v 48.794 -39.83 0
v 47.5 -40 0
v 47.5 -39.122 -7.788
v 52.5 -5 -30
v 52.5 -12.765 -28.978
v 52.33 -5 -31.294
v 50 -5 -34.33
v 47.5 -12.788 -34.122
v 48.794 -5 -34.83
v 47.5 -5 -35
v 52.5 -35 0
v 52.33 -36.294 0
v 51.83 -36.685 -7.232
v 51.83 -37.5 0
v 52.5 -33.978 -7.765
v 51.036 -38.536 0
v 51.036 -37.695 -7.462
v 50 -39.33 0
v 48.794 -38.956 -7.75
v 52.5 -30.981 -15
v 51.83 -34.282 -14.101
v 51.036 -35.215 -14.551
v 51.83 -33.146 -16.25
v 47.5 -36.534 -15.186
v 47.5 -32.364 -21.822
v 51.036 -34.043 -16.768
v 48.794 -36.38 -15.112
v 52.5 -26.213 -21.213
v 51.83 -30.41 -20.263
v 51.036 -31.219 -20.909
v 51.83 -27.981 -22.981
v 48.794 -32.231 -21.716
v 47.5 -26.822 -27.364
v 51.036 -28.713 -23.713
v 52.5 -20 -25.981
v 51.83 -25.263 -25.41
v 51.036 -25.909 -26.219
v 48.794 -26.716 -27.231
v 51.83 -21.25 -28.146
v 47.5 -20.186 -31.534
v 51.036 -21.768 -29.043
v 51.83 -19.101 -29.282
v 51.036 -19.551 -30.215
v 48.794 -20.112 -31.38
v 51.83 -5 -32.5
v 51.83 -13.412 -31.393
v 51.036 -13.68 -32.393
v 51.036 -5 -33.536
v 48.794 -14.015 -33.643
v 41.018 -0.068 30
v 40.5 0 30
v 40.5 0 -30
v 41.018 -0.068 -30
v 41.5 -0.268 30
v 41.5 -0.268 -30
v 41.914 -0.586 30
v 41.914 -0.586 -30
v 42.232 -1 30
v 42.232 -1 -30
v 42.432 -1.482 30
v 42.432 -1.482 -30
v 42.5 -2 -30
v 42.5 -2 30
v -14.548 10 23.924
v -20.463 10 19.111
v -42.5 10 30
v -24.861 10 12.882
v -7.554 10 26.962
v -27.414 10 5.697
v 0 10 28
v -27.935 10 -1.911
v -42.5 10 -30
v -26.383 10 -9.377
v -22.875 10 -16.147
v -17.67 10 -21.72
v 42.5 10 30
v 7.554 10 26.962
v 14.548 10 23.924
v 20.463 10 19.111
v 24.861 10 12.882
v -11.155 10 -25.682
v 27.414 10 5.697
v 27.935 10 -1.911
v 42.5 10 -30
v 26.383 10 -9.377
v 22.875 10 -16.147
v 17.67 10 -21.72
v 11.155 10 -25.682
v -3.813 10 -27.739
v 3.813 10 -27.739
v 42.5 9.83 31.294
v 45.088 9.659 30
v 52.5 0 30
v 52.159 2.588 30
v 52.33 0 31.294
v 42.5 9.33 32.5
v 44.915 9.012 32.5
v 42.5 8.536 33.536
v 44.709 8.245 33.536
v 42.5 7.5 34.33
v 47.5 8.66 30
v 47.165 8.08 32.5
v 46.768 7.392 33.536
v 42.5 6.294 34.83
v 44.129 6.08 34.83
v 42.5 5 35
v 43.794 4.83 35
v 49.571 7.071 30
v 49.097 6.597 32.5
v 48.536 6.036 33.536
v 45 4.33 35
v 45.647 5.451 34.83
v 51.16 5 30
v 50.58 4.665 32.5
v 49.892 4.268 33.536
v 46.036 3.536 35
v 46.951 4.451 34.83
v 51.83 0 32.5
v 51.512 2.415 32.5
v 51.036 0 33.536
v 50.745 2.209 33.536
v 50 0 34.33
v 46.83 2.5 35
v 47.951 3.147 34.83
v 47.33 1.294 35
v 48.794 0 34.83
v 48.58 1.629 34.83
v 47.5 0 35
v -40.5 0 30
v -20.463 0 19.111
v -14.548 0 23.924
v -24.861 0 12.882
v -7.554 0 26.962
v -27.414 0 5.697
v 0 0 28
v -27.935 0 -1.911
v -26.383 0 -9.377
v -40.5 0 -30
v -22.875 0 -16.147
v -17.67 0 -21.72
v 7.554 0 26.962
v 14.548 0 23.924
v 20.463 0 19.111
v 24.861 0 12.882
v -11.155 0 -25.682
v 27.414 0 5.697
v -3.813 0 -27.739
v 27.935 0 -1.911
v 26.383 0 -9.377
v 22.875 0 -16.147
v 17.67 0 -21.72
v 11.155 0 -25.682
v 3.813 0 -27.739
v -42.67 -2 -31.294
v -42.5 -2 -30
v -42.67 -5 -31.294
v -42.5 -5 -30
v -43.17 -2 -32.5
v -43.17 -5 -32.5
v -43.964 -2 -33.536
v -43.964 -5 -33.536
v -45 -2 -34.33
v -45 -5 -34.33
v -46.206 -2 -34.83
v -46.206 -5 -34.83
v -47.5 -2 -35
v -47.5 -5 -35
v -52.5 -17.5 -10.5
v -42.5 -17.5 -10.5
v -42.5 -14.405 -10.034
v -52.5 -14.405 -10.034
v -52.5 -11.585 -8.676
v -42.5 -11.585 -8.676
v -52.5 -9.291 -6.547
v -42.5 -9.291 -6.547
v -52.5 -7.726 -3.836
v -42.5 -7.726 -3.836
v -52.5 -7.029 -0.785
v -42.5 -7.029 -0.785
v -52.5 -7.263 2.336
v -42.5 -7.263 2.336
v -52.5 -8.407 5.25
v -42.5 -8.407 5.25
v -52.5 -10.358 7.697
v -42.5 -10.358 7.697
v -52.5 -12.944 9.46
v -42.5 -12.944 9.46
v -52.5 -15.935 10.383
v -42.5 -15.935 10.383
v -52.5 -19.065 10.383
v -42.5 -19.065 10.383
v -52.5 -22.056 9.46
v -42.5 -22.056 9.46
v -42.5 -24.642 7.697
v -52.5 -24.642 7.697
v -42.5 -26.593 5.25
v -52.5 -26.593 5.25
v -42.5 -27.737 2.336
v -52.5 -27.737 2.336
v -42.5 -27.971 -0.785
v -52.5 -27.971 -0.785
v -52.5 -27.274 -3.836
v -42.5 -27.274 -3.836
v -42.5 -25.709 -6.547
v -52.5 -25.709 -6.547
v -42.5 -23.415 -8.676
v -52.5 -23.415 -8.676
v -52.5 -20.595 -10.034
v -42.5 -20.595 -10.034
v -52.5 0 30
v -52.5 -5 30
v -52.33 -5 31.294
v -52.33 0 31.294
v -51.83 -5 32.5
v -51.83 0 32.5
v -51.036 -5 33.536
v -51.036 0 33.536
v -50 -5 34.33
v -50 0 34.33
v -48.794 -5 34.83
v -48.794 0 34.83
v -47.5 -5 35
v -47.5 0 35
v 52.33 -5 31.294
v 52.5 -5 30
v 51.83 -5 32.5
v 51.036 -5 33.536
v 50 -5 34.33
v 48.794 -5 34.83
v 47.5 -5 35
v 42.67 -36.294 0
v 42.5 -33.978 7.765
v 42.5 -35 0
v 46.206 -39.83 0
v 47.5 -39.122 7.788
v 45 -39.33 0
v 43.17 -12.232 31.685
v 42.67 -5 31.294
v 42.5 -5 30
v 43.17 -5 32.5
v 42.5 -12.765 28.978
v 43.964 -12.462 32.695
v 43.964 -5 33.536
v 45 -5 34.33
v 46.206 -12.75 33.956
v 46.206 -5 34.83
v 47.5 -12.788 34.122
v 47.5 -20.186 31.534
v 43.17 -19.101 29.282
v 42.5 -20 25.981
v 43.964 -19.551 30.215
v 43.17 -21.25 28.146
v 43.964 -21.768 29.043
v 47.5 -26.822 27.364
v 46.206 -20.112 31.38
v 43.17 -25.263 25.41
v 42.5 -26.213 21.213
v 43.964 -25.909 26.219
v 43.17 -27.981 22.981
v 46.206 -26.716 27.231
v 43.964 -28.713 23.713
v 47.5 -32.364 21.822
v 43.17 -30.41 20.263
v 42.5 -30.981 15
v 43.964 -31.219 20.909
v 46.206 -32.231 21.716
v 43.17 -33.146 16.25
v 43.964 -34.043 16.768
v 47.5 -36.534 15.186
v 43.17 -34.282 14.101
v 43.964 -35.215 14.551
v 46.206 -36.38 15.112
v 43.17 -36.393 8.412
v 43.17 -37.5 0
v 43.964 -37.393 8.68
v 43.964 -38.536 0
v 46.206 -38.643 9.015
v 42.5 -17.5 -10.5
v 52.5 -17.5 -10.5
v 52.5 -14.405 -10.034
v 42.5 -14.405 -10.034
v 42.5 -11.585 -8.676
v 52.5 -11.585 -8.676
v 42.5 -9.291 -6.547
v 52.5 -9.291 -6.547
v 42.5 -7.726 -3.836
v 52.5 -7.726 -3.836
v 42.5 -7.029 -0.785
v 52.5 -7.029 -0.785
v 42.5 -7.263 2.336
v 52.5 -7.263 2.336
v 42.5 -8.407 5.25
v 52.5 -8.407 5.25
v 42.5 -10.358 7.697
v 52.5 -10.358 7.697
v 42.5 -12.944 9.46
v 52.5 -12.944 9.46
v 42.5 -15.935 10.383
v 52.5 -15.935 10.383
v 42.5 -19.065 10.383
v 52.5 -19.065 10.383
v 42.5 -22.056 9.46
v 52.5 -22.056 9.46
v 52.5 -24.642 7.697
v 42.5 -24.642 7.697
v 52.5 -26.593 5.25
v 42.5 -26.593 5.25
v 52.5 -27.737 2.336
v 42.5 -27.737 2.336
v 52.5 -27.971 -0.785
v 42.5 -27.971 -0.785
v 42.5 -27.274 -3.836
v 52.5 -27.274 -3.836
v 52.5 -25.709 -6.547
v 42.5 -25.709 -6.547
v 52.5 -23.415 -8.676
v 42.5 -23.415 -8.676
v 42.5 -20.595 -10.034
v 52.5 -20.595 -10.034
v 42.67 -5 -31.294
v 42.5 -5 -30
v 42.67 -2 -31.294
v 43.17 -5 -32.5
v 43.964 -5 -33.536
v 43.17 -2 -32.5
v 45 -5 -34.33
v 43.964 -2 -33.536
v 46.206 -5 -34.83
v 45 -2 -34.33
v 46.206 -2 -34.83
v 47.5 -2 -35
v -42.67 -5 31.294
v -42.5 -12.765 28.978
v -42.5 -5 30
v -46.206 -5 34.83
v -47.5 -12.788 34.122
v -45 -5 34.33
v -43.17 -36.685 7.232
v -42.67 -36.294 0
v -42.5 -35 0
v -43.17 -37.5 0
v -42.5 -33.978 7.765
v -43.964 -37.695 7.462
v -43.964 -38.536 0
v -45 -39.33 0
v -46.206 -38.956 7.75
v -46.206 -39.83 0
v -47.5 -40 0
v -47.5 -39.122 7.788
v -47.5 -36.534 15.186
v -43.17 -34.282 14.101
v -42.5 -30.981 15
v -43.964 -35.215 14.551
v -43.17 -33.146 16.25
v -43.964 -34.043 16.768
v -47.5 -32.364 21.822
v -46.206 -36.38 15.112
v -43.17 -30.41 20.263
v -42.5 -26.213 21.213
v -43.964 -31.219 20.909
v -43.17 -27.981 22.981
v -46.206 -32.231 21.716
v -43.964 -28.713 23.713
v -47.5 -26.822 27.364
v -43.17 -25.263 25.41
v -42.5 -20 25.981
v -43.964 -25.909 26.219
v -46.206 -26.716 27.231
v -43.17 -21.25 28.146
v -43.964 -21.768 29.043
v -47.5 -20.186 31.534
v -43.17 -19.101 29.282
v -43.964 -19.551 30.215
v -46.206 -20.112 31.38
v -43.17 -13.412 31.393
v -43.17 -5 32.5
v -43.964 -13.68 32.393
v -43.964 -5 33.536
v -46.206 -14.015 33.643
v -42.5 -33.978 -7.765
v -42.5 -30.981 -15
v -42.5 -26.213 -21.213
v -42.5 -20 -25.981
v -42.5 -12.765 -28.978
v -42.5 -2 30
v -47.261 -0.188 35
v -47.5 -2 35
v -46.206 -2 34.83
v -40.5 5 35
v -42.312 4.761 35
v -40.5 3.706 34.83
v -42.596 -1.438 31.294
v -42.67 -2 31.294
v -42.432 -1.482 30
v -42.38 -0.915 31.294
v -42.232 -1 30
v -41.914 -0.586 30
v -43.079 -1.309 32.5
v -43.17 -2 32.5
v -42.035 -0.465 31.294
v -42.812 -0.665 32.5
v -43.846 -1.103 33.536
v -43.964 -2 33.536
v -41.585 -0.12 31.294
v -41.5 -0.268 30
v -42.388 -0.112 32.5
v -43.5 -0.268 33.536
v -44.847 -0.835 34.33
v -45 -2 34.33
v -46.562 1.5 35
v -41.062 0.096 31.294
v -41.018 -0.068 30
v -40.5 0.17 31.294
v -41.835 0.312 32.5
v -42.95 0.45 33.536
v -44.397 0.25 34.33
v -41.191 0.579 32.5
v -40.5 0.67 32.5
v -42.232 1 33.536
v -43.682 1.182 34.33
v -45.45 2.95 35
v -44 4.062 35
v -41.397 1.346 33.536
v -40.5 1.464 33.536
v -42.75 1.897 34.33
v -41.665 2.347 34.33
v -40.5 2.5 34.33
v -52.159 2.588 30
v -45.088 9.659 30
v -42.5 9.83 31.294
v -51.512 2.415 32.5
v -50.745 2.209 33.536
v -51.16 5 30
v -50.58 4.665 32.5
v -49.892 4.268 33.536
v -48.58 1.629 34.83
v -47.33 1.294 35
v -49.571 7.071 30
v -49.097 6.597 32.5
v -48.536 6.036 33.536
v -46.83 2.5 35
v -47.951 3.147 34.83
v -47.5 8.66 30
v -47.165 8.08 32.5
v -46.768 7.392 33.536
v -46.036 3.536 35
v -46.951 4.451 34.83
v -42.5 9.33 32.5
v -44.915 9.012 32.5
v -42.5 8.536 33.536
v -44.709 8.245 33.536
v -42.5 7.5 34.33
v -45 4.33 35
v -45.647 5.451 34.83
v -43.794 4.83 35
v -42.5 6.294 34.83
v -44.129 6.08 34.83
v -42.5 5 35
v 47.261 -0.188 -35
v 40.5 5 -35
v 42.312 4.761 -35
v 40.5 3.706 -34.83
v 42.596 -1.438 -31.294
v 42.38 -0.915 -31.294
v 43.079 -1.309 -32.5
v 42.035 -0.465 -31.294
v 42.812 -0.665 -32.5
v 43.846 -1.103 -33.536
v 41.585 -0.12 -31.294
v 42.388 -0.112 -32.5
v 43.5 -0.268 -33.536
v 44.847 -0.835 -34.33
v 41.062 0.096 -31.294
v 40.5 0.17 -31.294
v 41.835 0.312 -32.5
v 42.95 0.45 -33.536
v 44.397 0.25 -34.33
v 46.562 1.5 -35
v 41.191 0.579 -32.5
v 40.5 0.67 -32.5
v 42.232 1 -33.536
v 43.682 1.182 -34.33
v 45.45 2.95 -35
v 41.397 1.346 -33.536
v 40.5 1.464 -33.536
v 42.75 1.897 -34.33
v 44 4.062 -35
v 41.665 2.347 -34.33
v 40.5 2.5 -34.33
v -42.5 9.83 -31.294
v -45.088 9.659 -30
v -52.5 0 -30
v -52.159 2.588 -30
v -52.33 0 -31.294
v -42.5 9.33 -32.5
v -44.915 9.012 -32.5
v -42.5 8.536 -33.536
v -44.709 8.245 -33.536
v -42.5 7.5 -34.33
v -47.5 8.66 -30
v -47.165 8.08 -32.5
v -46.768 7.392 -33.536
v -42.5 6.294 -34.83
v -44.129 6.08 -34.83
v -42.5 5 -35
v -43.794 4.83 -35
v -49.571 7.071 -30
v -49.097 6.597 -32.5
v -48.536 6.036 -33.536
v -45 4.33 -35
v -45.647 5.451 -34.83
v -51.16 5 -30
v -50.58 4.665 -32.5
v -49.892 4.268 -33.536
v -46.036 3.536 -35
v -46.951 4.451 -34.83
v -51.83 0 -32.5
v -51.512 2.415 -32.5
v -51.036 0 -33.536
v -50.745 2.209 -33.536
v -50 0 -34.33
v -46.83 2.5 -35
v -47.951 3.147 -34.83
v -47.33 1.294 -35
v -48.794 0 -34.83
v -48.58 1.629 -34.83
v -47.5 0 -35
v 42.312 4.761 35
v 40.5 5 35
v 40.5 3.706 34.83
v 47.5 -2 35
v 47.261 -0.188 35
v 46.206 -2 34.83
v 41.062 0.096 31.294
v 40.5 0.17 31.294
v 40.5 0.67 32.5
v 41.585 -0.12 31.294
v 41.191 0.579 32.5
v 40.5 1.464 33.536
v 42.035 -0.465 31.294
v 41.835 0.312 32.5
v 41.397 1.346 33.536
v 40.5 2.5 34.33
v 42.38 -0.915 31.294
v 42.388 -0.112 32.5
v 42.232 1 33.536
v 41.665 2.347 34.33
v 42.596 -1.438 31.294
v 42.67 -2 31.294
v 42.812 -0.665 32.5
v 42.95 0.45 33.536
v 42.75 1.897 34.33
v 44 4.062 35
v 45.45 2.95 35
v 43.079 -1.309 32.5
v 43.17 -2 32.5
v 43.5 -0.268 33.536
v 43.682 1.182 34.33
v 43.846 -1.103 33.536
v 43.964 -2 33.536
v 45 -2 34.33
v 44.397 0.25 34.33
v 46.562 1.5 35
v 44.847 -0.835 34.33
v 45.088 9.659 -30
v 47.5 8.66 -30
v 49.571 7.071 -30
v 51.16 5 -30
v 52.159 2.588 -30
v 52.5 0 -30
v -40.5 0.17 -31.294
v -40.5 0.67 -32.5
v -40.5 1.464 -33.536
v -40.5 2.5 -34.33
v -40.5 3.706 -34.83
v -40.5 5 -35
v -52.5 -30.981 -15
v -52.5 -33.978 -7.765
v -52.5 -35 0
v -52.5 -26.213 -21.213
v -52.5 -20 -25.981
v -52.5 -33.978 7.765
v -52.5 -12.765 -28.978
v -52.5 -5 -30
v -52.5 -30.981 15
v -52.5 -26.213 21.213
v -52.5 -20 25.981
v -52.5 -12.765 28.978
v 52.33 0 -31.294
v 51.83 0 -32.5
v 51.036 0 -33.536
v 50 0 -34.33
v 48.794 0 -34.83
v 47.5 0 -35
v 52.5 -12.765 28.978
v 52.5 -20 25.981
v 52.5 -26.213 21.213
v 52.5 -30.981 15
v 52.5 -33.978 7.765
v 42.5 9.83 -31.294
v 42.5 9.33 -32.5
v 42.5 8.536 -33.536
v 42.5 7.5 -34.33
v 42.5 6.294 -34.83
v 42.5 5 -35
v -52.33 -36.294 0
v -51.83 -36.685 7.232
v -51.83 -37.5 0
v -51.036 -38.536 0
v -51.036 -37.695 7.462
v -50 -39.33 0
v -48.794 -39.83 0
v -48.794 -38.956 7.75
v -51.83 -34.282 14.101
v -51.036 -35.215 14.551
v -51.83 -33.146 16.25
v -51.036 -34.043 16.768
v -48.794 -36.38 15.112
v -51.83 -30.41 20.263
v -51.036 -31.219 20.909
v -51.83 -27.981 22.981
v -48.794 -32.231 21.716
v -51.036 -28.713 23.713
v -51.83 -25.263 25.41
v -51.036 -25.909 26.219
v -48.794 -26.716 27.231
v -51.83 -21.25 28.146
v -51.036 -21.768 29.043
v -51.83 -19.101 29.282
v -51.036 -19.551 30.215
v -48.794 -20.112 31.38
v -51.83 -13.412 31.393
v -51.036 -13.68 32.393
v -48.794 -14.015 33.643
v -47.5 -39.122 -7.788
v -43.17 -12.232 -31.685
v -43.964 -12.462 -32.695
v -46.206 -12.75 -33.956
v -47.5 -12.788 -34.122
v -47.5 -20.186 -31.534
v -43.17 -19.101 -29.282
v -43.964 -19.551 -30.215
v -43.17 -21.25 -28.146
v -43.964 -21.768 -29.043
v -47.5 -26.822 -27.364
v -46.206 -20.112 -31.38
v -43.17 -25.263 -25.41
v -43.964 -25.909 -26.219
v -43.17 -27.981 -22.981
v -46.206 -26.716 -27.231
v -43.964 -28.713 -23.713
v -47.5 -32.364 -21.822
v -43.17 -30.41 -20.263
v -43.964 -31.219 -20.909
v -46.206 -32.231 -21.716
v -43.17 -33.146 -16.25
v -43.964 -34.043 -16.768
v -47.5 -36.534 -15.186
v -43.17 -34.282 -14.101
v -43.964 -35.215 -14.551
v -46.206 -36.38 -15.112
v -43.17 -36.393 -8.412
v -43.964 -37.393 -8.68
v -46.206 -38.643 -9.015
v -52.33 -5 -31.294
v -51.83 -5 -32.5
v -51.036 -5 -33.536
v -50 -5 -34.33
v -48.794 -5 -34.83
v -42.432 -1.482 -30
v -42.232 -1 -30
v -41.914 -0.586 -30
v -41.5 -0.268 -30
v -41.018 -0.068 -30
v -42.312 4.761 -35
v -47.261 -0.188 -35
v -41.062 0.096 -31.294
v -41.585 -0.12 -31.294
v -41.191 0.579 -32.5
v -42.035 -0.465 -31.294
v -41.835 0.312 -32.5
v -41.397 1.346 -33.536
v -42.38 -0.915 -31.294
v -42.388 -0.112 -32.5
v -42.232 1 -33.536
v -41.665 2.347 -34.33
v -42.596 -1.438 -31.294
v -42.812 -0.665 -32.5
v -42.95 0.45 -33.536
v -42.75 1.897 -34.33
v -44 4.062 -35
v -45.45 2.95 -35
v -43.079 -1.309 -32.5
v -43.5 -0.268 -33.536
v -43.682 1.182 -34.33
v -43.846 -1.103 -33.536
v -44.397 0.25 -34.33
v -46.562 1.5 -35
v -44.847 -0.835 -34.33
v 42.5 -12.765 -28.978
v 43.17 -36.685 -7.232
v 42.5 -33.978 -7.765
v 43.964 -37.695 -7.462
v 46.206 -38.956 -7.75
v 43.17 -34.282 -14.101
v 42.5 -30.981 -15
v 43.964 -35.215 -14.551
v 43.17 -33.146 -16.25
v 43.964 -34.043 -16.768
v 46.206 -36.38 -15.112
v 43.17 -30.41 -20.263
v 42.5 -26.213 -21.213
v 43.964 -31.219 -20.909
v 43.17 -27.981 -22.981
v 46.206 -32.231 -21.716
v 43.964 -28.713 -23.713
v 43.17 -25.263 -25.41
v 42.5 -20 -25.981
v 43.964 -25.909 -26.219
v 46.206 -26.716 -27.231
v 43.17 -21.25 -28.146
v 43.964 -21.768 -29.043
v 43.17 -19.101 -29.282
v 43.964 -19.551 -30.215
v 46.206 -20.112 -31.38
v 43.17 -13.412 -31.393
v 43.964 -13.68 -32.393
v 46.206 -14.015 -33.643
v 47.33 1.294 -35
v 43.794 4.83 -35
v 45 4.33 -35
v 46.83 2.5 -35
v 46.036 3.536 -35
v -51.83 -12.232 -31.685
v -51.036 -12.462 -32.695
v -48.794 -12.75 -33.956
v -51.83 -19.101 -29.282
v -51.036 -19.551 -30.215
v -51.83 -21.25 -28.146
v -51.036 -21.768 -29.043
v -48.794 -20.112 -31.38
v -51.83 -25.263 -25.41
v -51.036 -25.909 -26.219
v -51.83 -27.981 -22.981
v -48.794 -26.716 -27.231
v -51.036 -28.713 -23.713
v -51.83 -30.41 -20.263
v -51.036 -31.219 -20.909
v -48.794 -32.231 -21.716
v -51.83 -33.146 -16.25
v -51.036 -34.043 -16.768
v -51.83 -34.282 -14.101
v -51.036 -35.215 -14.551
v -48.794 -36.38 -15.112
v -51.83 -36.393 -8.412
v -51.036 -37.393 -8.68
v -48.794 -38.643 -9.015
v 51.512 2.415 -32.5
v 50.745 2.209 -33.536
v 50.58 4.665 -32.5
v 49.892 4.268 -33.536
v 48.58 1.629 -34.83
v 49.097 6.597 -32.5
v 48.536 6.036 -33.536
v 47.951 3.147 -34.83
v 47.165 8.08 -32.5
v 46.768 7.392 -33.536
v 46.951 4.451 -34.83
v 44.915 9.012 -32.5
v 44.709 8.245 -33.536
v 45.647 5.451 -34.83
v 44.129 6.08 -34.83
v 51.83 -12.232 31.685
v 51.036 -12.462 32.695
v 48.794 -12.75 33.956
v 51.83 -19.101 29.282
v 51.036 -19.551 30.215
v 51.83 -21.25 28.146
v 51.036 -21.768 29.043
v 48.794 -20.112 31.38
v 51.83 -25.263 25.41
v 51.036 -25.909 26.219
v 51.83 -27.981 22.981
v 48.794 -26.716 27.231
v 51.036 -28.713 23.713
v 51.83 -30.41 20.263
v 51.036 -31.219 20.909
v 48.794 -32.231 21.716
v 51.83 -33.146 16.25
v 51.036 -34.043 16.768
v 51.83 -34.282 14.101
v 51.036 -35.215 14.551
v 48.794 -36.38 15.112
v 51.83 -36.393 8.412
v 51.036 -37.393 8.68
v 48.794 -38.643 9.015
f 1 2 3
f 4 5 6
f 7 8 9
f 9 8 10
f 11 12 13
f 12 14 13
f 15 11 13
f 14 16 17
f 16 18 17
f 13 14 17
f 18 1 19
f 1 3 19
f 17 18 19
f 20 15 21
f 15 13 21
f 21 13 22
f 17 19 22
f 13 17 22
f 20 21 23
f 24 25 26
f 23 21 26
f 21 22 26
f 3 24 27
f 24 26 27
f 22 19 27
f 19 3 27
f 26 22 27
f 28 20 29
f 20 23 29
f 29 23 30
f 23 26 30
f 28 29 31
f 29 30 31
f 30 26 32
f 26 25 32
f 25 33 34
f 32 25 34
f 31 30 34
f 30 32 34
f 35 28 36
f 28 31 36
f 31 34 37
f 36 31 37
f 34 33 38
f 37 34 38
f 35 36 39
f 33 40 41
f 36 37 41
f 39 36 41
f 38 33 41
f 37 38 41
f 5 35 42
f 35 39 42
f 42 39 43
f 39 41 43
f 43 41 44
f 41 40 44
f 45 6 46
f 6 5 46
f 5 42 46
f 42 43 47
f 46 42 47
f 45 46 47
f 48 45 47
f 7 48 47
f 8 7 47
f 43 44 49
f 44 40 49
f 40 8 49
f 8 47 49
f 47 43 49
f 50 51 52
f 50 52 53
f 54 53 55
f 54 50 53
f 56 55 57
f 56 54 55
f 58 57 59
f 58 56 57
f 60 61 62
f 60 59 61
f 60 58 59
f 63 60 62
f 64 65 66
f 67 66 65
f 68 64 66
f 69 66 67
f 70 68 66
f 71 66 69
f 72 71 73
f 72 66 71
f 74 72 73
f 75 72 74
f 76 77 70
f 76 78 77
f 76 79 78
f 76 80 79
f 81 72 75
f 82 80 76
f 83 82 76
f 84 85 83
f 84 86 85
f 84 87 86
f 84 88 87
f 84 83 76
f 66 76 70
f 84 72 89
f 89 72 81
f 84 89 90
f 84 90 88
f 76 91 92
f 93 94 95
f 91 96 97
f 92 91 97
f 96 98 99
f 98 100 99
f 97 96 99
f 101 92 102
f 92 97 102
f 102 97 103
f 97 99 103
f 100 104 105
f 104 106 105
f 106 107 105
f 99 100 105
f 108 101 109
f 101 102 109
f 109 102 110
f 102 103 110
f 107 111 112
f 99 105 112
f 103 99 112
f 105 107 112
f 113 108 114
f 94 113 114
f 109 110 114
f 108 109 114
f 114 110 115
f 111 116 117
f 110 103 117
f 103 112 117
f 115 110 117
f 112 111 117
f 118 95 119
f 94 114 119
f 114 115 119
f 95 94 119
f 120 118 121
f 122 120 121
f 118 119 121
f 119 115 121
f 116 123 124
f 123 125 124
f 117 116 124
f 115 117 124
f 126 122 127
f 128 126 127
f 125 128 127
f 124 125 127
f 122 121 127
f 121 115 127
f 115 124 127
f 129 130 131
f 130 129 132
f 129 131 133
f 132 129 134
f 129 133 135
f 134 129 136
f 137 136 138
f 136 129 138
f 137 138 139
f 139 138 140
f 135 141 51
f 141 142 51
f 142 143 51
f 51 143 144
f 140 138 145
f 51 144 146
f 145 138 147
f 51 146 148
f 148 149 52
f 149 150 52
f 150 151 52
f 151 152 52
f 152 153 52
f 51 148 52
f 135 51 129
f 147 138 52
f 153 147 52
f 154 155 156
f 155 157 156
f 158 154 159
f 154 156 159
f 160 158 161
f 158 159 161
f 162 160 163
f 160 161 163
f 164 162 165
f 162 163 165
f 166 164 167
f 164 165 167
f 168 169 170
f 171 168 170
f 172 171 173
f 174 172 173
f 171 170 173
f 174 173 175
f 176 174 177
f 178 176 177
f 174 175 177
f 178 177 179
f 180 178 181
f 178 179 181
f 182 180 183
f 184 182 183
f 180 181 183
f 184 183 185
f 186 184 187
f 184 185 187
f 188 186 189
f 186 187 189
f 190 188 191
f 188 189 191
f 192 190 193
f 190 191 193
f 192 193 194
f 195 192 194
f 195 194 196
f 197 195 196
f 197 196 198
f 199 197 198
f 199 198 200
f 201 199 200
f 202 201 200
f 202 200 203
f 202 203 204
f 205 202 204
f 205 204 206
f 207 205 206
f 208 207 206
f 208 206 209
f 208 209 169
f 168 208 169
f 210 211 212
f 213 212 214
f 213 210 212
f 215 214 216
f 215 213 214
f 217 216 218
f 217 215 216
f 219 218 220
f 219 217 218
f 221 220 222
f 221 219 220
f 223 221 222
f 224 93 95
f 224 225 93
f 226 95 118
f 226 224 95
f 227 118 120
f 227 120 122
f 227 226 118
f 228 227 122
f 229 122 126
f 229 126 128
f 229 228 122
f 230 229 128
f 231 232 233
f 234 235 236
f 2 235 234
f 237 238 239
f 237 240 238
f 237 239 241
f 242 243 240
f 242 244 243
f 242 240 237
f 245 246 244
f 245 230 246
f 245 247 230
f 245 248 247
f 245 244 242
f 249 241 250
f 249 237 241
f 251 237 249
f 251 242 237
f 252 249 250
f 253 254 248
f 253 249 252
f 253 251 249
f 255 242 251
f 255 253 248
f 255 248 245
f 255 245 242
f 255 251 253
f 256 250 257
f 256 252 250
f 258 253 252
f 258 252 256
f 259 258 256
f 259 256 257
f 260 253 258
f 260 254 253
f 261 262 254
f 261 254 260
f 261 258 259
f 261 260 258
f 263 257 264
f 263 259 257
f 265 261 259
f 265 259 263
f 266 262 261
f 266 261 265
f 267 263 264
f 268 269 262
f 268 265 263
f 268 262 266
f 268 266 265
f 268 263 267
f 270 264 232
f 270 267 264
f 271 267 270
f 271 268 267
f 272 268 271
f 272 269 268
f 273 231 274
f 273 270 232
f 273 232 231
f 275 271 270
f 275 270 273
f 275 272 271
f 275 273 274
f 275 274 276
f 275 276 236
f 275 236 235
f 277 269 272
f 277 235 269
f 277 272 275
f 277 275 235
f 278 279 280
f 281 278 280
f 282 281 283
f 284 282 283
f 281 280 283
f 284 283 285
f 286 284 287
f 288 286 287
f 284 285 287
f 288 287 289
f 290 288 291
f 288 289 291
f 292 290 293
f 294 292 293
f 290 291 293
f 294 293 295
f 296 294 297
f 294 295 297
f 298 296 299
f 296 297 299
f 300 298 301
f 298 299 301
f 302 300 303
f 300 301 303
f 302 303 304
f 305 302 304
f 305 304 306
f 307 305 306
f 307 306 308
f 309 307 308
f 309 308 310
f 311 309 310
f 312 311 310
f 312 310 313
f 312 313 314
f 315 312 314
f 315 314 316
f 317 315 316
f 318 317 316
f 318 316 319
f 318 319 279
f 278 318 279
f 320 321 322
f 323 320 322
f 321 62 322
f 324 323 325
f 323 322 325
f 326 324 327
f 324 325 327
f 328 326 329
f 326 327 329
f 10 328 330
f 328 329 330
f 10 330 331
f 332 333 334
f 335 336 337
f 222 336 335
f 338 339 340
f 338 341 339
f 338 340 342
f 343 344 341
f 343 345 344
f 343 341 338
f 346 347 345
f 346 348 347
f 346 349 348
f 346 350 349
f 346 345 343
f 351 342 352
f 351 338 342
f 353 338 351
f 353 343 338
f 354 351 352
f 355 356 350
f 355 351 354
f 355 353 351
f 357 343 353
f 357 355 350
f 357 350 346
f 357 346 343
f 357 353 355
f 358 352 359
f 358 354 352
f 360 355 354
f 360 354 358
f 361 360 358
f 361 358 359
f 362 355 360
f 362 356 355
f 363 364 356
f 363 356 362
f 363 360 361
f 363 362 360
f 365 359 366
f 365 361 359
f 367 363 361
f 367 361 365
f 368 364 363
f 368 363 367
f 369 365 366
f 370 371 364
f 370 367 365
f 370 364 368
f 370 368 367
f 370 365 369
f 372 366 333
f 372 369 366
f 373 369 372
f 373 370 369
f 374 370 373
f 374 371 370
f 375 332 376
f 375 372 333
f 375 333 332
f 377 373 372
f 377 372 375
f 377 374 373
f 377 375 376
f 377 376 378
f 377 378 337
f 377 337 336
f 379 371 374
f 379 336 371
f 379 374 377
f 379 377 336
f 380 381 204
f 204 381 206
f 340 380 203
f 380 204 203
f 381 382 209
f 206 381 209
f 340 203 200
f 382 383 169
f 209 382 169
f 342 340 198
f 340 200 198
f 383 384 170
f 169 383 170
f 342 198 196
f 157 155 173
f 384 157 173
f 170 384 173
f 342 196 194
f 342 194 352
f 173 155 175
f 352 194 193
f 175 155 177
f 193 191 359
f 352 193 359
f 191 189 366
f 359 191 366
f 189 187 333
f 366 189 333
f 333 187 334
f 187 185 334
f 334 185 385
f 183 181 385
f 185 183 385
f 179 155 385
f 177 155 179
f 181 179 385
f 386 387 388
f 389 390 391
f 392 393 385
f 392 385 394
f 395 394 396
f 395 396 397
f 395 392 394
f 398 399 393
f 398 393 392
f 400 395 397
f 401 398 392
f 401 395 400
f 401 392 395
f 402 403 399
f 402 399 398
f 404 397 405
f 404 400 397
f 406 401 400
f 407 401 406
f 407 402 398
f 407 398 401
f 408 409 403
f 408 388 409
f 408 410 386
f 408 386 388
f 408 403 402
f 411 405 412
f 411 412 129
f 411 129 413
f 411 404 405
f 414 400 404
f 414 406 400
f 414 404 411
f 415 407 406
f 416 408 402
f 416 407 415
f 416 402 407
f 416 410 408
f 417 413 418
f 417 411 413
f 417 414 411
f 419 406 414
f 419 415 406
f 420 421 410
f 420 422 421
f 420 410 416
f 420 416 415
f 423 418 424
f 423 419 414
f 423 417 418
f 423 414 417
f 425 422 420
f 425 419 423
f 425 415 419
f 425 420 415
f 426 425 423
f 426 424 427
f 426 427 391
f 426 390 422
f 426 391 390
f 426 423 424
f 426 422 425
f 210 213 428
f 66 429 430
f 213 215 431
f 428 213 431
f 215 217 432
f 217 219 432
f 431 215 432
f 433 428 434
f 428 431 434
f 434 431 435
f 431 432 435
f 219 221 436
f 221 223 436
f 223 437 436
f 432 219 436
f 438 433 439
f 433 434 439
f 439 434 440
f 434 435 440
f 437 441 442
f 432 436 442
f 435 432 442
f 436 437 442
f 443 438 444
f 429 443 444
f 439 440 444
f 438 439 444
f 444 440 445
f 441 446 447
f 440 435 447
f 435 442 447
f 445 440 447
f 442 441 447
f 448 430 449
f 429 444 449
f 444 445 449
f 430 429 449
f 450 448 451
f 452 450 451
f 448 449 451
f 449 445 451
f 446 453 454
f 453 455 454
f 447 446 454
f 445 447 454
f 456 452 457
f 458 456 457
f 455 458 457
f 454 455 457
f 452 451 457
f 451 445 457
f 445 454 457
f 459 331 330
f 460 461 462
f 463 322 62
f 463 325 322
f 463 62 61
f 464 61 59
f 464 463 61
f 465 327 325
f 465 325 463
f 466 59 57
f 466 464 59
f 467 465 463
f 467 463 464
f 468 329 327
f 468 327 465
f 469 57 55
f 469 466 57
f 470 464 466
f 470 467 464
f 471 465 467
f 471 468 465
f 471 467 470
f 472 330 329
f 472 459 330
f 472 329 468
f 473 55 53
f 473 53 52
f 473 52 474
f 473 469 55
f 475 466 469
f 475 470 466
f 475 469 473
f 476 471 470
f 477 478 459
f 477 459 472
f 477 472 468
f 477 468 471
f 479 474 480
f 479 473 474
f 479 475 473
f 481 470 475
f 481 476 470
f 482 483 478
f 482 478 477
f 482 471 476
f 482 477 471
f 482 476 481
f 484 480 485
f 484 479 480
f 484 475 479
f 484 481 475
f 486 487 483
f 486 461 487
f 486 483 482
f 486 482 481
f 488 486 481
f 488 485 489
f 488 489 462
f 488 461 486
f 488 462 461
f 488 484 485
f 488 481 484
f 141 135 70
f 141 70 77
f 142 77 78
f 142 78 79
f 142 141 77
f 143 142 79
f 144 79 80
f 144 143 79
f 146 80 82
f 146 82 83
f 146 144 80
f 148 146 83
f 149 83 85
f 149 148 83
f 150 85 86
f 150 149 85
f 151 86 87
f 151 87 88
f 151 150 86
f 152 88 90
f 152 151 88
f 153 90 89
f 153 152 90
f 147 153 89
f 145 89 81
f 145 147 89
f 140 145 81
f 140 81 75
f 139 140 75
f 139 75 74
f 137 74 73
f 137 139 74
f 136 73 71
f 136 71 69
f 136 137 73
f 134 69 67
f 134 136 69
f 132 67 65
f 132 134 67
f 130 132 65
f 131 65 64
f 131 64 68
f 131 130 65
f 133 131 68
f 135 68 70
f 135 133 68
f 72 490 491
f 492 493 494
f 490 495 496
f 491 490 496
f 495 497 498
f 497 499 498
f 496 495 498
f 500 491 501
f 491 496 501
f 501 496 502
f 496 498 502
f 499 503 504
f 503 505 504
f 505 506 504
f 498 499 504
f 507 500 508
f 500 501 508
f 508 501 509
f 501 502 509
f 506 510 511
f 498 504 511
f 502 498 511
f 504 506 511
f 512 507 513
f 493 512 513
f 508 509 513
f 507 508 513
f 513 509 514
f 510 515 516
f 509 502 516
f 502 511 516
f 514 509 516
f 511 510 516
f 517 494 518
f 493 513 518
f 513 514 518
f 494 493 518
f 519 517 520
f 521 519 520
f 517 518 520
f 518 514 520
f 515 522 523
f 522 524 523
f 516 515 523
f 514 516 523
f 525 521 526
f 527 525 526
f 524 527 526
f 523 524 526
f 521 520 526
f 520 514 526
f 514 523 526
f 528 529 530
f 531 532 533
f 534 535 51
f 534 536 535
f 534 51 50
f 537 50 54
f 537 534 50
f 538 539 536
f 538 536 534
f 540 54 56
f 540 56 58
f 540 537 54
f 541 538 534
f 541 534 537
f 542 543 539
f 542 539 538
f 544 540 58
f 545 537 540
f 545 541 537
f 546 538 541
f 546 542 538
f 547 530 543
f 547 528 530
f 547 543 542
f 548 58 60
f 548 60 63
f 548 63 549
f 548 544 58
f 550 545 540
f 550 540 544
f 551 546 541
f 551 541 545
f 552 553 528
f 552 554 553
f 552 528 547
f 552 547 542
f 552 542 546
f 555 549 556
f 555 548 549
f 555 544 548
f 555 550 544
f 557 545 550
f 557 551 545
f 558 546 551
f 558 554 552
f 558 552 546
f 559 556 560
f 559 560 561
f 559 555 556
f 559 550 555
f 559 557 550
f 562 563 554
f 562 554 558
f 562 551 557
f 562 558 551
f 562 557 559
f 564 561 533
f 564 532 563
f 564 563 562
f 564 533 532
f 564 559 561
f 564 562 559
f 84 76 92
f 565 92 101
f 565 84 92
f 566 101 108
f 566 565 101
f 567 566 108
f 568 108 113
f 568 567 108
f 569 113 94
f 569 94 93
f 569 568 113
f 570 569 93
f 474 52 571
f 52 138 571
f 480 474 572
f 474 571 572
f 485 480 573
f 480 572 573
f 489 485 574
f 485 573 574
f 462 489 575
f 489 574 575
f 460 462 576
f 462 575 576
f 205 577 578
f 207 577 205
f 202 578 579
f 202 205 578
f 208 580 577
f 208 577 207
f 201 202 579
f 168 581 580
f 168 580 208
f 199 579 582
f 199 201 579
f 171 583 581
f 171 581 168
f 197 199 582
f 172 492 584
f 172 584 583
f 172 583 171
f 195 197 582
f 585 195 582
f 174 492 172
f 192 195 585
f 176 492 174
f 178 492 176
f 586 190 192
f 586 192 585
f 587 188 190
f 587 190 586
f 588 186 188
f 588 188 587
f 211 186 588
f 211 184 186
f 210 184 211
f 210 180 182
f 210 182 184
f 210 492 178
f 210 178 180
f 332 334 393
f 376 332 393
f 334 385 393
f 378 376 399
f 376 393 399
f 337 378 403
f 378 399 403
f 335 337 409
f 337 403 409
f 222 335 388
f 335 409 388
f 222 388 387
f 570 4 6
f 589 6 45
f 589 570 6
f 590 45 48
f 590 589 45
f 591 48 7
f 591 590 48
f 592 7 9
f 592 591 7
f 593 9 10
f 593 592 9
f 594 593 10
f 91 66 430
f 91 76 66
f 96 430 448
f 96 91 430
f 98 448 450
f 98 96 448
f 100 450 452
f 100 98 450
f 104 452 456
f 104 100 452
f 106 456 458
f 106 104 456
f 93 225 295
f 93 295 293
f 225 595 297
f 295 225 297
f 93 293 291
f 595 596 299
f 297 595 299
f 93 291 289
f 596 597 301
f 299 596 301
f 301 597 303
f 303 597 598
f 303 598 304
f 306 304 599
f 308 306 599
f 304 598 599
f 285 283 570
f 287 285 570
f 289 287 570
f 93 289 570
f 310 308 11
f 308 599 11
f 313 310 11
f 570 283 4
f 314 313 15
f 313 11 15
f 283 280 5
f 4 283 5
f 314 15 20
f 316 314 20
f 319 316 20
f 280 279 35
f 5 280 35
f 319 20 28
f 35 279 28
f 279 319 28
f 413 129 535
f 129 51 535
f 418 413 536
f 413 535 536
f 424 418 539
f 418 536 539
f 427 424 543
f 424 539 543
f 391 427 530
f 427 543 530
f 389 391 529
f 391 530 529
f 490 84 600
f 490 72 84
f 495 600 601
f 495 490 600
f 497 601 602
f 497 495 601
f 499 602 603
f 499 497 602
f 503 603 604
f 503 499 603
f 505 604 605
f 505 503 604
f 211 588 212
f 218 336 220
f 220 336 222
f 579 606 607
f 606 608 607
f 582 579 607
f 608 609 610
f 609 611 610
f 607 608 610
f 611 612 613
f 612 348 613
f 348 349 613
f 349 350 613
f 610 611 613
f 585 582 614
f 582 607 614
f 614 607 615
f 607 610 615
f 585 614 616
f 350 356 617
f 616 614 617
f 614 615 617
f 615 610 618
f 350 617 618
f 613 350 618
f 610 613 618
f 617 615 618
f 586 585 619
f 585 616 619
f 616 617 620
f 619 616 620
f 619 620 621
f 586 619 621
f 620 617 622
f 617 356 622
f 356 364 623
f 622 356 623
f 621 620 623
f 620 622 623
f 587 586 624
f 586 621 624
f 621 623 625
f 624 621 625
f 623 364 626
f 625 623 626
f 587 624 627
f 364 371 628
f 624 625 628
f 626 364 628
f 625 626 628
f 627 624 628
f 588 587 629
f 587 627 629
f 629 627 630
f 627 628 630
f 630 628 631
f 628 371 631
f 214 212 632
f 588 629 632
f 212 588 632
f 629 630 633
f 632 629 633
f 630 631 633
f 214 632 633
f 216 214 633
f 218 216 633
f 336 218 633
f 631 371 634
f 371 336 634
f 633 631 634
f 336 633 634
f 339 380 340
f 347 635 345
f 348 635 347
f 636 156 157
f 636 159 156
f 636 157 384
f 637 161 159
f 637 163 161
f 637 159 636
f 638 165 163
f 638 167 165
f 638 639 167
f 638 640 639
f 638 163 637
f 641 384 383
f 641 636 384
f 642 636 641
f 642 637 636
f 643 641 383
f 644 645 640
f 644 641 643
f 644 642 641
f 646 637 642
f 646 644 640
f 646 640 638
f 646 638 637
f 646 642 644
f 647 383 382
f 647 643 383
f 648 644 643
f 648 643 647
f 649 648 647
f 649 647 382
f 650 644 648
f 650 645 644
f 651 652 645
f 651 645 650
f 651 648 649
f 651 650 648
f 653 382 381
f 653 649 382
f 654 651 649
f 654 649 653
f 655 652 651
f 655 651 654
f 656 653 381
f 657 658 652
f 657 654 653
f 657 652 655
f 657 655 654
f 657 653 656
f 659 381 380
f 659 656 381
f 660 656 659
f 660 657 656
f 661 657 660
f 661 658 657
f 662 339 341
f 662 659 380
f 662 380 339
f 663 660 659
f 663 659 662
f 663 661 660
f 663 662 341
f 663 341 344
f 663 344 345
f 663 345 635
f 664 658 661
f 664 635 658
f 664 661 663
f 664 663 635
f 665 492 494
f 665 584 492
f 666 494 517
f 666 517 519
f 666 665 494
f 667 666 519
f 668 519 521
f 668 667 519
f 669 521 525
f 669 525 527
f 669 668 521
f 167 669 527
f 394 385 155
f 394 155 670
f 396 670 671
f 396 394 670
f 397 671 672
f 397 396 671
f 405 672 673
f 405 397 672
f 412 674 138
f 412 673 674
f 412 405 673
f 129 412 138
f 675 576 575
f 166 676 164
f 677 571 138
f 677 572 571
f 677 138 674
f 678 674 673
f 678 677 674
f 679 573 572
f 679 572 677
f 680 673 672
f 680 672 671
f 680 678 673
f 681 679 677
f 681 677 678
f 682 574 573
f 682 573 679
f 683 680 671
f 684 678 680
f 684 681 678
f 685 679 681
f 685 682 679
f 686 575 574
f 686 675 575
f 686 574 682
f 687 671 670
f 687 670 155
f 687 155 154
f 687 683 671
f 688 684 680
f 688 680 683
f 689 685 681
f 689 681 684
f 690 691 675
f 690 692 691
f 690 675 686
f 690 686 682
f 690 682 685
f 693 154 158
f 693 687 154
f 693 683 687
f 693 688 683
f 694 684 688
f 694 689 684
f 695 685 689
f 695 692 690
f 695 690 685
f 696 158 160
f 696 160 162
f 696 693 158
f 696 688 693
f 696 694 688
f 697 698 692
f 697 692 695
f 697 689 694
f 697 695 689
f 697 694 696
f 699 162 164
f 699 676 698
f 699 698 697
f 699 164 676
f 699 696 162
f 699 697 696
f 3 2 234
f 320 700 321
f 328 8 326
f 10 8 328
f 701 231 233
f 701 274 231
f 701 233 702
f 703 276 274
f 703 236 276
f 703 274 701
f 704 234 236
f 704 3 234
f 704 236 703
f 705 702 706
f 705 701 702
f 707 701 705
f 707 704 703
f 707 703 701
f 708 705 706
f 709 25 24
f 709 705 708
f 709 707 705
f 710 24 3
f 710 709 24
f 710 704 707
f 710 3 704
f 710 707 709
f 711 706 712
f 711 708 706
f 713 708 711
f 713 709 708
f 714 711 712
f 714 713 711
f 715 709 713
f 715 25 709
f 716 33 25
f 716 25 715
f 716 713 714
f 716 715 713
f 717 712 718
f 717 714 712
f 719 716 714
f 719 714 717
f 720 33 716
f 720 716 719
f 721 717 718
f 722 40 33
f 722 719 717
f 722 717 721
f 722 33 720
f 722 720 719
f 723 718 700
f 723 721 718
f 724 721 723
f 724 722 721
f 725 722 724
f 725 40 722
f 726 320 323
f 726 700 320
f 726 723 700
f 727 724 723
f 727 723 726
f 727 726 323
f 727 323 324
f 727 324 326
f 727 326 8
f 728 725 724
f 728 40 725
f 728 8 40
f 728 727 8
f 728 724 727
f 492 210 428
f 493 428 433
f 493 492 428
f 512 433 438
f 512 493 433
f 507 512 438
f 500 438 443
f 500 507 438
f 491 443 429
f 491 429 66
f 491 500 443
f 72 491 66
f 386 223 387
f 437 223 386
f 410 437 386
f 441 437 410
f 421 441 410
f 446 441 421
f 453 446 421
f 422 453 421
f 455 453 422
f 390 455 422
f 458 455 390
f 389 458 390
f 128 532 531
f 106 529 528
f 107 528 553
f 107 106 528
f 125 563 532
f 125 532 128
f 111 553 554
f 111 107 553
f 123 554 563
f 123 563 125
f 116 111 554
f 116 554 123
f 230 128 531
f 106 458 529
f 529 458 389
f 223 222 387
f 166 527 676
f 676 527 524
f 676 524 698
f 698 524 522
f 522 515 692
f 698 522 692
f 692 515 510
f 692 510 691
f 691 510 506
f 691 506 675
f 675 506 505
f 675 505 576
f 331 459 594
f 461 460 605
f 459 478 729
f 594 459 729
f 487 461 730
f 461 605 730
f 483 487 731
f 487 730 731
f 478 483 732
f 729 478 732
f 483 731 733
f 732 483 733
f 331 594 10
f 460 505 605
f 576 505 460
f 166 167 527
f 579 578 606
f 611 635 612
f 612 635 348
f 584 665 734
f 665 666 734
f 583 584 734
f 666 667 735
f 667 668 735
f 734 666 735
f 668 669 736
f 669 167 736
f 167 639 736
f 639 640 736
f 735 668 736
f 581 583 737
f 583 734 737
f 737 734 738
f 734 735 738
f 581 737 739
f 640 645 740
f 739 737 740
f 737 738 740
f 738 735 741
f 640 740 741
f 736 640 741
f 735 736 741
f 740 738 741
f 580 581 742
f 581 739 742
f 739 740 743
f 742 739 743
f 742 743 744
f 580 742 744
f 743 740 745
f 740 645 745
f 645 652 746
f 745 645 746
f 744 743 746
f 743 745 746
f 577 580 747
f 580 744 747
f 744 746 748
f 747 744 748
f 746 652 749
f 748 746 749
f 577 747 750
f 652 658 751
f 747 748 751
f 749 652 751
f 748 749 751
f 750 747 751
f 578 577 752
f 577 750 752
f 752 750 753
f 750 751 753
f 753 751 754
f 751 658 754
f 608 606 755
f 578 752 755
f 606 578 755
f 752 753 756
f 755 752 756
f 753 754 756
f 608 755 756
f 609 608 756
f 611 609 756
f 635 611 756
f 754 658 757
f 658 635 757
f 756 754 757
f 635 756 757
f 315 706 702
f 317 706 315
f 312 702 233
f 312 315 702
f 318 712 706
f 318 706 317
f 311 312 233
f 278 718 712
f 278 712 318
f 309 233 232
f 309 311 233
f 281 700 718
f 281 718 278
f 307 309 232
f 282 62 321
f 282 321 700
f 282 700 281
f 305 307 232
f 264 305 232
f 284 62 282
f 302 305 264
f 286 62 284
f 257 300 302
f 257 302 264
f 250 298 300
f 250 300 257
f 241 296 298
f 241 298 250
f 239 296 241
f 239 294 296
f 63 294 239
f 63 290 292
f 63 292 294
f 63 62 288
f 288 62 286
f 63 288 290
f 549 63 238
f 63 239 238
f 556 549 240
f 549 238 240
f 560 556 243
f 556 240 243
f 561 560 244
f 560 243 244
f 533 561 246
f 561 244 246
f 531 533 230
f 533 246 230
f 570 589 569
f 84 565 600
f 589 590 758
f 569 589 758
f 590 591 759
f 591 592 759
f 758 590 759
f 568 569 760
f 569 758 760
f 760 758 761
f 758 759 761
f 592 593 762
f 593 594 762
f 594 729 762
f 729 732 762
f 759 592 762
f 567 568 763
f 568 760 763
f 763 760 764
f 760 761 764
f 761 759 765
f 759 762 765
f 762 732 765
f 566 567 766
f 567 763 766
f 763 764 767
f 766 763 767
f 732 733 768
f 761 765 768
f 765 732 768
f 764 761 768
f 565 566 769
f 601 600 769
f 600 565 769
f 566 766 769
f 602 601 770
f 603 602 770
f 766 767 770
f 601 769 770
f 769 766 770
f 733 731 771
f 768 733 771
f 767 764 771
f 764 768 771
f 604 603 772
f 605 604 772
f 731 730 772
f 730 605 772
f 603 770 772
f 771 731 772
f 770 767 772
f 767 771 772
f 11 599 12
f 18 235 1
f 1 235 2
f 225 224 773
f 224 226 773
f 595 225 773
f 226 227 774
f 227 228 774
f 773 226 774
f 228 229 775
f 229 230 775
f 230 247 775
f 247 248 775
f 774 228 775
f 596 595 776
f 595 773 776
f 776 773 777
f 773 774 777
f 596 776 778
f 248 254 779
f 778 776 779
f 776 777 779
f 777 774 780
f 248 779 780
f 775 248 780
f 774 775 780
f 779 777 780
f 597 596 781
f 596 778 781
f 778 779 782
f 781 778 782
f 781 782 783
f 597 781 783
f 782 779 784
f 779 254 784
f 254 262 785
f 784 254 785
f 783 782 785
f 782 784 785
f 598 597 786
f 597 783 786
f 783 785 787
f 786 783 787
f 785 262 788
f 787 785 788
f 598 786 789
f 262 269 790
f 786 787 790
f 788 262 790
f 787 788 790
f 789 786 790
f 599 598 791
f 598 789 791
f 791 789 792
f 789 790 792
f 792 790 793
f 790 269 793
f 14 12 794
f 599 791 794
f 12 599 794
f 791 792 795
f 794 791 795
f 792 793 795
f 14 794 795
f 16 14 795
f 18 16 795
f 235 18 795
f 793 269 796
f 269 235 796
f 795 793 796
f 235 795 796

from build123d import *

# Parameters (mm, degrees)
SKETCH1_W           = 105
SKETCH1_H           = 70
SKETCH1_R           = 28
BOSS_EXTRUDE1_DEPTH = 10
SKETCH3_W           = 10
SKETCH3_H           = 70
BOSS_EXTRUDE2_DEPTH = 40
SKETCH5_R           = 10.5
CUT_EXTRUDE1_DEPTH  = 118.686022959
FILLET1_R           = 35
FILLET2_R           = 10
FILLET3_R           = 2
FILLET4_R           = 5


with BuildPart() as part:
    # Sketch1 → Boss-Extrude1 (new body)
    with BuildSketch(Plane(origin=(0, 0, 0), x_dir=(1, 0, 0), z_dir=(0, 1, 0))):
        Rectangle(SKETCH1_W, SKETCH1_H)
        with Locations(Location((0, 0, 0), (0, 0, 270))):
            Circle(SKETCH1_R, mode=Mode.SUBTRACT)
    extrude(amount=BOSS_EXTRUDE1_DEPTH)

    # Sketch3 → Boss-Extrude2 (add)
    with BuildSketch(Plane.XZ):
        with Locations((-47.5, 0)):
            Rectangle(SKETCH3_W, SKETCH3_H)
        with Locations((47.5, 0)):
            Rectangle(SKETCH3_W, SKETCH3_H)
    extrude(amount=BOSS_EXTRUDE2_DEPTH)

    # Sketch5 → Cut-Extrude1 (cut, through all)
    with BuildSketch(Plane(origin=(52.5, 0, 0), x_dir=(0, 0, -1), z_dir=(1, 0, 0))):
        with Locations((0, -17.5)):
            Circle(SKETCH5_R)
    extrude(amount=-CUT_EXTRUDE1_DEPTH, mode=Mode.SUBTRACT)

    # Fillet1
    fillet1_edges = [part.edges().sort_by_distance(p)[0] for p in [
        (47.5, -40, 35),
        (47.5, -40, -35),
        (-47.5, -40, 35),
        (-47.5, -40, -35),
    ]]
    fillet(fillet1_edges, radius=FILLET1_R - 0.0001)  # a hair under: the kernel refuses the full size

    # Fillet2
    fillet2_edges = [part.edges().sort_by_distance(p)[0] for p in [
        (52.5, 10, 0),
        (-52.5, 10, 0),
    ]]
    fillet(fillet2_edges, radius=FILLET2_R)

    # Fillet3
    fillet3_edges = [part.edges().sort_by_distance(p)[0] for p in [
        (-42.5, 0, 0),
        (42.5, 0, 0),
    ]]
    fillet(fillet3_edges, radius=FILLET3_R)

    # Fillet4
    fillet4_edges = [part.edges().sort_by_distance(p)[0] for p in [
        (-41.914213562, -0.585786438, 35),
        (-42.5, -29.748766631, 24.748766631),
        (-42.5, -29.748766631, -24.748766631),
        (-41.914213562, -0.585786438, -35),
        (0, 0, -35),
        (41.914213562, -0.585786438, -35),
        (42.5, -29.748766631, -24.748766631),
        (42.5, -29.748766631, 24.748766631),
        (41.914213562, -0.585786438, 35),
        (-49.571067812, 7.071067812, 35),
        (-52.5, -2.50005, 35),
        (-52.5, -29.748766631, 24.748766631),
        (-52.5, -29.748766631, -24.748766631),
        (-52.5, -2.50005, -35),
        (-49.571067812, 7.071067812, -35),
        (0, 10, -35),
        (49.571067812, 7.071067812, -35),
        (52.5, -2.50005, -35),
        (52.5, -29.748766631, -24.748766631),
        (52.5, -29.748766631, 24.748766631),
        (52.5, -2.50005, 35),
        (49.571067812, 7.071067812, 35),
        (0, 0, 35),
        (0, 10, 35),
        (-42.5, -3.50005, 35),
        (-42.5, -3.50005, -35),
        (42.5, -3.50005, -35),
        (42.5, -3.50005, 35),
    ]]
    fillet(fillet4_edges, radius=FILLET4_R - 0.0001)  # a hair under: the kernel refuses the full size


solid = part.part
